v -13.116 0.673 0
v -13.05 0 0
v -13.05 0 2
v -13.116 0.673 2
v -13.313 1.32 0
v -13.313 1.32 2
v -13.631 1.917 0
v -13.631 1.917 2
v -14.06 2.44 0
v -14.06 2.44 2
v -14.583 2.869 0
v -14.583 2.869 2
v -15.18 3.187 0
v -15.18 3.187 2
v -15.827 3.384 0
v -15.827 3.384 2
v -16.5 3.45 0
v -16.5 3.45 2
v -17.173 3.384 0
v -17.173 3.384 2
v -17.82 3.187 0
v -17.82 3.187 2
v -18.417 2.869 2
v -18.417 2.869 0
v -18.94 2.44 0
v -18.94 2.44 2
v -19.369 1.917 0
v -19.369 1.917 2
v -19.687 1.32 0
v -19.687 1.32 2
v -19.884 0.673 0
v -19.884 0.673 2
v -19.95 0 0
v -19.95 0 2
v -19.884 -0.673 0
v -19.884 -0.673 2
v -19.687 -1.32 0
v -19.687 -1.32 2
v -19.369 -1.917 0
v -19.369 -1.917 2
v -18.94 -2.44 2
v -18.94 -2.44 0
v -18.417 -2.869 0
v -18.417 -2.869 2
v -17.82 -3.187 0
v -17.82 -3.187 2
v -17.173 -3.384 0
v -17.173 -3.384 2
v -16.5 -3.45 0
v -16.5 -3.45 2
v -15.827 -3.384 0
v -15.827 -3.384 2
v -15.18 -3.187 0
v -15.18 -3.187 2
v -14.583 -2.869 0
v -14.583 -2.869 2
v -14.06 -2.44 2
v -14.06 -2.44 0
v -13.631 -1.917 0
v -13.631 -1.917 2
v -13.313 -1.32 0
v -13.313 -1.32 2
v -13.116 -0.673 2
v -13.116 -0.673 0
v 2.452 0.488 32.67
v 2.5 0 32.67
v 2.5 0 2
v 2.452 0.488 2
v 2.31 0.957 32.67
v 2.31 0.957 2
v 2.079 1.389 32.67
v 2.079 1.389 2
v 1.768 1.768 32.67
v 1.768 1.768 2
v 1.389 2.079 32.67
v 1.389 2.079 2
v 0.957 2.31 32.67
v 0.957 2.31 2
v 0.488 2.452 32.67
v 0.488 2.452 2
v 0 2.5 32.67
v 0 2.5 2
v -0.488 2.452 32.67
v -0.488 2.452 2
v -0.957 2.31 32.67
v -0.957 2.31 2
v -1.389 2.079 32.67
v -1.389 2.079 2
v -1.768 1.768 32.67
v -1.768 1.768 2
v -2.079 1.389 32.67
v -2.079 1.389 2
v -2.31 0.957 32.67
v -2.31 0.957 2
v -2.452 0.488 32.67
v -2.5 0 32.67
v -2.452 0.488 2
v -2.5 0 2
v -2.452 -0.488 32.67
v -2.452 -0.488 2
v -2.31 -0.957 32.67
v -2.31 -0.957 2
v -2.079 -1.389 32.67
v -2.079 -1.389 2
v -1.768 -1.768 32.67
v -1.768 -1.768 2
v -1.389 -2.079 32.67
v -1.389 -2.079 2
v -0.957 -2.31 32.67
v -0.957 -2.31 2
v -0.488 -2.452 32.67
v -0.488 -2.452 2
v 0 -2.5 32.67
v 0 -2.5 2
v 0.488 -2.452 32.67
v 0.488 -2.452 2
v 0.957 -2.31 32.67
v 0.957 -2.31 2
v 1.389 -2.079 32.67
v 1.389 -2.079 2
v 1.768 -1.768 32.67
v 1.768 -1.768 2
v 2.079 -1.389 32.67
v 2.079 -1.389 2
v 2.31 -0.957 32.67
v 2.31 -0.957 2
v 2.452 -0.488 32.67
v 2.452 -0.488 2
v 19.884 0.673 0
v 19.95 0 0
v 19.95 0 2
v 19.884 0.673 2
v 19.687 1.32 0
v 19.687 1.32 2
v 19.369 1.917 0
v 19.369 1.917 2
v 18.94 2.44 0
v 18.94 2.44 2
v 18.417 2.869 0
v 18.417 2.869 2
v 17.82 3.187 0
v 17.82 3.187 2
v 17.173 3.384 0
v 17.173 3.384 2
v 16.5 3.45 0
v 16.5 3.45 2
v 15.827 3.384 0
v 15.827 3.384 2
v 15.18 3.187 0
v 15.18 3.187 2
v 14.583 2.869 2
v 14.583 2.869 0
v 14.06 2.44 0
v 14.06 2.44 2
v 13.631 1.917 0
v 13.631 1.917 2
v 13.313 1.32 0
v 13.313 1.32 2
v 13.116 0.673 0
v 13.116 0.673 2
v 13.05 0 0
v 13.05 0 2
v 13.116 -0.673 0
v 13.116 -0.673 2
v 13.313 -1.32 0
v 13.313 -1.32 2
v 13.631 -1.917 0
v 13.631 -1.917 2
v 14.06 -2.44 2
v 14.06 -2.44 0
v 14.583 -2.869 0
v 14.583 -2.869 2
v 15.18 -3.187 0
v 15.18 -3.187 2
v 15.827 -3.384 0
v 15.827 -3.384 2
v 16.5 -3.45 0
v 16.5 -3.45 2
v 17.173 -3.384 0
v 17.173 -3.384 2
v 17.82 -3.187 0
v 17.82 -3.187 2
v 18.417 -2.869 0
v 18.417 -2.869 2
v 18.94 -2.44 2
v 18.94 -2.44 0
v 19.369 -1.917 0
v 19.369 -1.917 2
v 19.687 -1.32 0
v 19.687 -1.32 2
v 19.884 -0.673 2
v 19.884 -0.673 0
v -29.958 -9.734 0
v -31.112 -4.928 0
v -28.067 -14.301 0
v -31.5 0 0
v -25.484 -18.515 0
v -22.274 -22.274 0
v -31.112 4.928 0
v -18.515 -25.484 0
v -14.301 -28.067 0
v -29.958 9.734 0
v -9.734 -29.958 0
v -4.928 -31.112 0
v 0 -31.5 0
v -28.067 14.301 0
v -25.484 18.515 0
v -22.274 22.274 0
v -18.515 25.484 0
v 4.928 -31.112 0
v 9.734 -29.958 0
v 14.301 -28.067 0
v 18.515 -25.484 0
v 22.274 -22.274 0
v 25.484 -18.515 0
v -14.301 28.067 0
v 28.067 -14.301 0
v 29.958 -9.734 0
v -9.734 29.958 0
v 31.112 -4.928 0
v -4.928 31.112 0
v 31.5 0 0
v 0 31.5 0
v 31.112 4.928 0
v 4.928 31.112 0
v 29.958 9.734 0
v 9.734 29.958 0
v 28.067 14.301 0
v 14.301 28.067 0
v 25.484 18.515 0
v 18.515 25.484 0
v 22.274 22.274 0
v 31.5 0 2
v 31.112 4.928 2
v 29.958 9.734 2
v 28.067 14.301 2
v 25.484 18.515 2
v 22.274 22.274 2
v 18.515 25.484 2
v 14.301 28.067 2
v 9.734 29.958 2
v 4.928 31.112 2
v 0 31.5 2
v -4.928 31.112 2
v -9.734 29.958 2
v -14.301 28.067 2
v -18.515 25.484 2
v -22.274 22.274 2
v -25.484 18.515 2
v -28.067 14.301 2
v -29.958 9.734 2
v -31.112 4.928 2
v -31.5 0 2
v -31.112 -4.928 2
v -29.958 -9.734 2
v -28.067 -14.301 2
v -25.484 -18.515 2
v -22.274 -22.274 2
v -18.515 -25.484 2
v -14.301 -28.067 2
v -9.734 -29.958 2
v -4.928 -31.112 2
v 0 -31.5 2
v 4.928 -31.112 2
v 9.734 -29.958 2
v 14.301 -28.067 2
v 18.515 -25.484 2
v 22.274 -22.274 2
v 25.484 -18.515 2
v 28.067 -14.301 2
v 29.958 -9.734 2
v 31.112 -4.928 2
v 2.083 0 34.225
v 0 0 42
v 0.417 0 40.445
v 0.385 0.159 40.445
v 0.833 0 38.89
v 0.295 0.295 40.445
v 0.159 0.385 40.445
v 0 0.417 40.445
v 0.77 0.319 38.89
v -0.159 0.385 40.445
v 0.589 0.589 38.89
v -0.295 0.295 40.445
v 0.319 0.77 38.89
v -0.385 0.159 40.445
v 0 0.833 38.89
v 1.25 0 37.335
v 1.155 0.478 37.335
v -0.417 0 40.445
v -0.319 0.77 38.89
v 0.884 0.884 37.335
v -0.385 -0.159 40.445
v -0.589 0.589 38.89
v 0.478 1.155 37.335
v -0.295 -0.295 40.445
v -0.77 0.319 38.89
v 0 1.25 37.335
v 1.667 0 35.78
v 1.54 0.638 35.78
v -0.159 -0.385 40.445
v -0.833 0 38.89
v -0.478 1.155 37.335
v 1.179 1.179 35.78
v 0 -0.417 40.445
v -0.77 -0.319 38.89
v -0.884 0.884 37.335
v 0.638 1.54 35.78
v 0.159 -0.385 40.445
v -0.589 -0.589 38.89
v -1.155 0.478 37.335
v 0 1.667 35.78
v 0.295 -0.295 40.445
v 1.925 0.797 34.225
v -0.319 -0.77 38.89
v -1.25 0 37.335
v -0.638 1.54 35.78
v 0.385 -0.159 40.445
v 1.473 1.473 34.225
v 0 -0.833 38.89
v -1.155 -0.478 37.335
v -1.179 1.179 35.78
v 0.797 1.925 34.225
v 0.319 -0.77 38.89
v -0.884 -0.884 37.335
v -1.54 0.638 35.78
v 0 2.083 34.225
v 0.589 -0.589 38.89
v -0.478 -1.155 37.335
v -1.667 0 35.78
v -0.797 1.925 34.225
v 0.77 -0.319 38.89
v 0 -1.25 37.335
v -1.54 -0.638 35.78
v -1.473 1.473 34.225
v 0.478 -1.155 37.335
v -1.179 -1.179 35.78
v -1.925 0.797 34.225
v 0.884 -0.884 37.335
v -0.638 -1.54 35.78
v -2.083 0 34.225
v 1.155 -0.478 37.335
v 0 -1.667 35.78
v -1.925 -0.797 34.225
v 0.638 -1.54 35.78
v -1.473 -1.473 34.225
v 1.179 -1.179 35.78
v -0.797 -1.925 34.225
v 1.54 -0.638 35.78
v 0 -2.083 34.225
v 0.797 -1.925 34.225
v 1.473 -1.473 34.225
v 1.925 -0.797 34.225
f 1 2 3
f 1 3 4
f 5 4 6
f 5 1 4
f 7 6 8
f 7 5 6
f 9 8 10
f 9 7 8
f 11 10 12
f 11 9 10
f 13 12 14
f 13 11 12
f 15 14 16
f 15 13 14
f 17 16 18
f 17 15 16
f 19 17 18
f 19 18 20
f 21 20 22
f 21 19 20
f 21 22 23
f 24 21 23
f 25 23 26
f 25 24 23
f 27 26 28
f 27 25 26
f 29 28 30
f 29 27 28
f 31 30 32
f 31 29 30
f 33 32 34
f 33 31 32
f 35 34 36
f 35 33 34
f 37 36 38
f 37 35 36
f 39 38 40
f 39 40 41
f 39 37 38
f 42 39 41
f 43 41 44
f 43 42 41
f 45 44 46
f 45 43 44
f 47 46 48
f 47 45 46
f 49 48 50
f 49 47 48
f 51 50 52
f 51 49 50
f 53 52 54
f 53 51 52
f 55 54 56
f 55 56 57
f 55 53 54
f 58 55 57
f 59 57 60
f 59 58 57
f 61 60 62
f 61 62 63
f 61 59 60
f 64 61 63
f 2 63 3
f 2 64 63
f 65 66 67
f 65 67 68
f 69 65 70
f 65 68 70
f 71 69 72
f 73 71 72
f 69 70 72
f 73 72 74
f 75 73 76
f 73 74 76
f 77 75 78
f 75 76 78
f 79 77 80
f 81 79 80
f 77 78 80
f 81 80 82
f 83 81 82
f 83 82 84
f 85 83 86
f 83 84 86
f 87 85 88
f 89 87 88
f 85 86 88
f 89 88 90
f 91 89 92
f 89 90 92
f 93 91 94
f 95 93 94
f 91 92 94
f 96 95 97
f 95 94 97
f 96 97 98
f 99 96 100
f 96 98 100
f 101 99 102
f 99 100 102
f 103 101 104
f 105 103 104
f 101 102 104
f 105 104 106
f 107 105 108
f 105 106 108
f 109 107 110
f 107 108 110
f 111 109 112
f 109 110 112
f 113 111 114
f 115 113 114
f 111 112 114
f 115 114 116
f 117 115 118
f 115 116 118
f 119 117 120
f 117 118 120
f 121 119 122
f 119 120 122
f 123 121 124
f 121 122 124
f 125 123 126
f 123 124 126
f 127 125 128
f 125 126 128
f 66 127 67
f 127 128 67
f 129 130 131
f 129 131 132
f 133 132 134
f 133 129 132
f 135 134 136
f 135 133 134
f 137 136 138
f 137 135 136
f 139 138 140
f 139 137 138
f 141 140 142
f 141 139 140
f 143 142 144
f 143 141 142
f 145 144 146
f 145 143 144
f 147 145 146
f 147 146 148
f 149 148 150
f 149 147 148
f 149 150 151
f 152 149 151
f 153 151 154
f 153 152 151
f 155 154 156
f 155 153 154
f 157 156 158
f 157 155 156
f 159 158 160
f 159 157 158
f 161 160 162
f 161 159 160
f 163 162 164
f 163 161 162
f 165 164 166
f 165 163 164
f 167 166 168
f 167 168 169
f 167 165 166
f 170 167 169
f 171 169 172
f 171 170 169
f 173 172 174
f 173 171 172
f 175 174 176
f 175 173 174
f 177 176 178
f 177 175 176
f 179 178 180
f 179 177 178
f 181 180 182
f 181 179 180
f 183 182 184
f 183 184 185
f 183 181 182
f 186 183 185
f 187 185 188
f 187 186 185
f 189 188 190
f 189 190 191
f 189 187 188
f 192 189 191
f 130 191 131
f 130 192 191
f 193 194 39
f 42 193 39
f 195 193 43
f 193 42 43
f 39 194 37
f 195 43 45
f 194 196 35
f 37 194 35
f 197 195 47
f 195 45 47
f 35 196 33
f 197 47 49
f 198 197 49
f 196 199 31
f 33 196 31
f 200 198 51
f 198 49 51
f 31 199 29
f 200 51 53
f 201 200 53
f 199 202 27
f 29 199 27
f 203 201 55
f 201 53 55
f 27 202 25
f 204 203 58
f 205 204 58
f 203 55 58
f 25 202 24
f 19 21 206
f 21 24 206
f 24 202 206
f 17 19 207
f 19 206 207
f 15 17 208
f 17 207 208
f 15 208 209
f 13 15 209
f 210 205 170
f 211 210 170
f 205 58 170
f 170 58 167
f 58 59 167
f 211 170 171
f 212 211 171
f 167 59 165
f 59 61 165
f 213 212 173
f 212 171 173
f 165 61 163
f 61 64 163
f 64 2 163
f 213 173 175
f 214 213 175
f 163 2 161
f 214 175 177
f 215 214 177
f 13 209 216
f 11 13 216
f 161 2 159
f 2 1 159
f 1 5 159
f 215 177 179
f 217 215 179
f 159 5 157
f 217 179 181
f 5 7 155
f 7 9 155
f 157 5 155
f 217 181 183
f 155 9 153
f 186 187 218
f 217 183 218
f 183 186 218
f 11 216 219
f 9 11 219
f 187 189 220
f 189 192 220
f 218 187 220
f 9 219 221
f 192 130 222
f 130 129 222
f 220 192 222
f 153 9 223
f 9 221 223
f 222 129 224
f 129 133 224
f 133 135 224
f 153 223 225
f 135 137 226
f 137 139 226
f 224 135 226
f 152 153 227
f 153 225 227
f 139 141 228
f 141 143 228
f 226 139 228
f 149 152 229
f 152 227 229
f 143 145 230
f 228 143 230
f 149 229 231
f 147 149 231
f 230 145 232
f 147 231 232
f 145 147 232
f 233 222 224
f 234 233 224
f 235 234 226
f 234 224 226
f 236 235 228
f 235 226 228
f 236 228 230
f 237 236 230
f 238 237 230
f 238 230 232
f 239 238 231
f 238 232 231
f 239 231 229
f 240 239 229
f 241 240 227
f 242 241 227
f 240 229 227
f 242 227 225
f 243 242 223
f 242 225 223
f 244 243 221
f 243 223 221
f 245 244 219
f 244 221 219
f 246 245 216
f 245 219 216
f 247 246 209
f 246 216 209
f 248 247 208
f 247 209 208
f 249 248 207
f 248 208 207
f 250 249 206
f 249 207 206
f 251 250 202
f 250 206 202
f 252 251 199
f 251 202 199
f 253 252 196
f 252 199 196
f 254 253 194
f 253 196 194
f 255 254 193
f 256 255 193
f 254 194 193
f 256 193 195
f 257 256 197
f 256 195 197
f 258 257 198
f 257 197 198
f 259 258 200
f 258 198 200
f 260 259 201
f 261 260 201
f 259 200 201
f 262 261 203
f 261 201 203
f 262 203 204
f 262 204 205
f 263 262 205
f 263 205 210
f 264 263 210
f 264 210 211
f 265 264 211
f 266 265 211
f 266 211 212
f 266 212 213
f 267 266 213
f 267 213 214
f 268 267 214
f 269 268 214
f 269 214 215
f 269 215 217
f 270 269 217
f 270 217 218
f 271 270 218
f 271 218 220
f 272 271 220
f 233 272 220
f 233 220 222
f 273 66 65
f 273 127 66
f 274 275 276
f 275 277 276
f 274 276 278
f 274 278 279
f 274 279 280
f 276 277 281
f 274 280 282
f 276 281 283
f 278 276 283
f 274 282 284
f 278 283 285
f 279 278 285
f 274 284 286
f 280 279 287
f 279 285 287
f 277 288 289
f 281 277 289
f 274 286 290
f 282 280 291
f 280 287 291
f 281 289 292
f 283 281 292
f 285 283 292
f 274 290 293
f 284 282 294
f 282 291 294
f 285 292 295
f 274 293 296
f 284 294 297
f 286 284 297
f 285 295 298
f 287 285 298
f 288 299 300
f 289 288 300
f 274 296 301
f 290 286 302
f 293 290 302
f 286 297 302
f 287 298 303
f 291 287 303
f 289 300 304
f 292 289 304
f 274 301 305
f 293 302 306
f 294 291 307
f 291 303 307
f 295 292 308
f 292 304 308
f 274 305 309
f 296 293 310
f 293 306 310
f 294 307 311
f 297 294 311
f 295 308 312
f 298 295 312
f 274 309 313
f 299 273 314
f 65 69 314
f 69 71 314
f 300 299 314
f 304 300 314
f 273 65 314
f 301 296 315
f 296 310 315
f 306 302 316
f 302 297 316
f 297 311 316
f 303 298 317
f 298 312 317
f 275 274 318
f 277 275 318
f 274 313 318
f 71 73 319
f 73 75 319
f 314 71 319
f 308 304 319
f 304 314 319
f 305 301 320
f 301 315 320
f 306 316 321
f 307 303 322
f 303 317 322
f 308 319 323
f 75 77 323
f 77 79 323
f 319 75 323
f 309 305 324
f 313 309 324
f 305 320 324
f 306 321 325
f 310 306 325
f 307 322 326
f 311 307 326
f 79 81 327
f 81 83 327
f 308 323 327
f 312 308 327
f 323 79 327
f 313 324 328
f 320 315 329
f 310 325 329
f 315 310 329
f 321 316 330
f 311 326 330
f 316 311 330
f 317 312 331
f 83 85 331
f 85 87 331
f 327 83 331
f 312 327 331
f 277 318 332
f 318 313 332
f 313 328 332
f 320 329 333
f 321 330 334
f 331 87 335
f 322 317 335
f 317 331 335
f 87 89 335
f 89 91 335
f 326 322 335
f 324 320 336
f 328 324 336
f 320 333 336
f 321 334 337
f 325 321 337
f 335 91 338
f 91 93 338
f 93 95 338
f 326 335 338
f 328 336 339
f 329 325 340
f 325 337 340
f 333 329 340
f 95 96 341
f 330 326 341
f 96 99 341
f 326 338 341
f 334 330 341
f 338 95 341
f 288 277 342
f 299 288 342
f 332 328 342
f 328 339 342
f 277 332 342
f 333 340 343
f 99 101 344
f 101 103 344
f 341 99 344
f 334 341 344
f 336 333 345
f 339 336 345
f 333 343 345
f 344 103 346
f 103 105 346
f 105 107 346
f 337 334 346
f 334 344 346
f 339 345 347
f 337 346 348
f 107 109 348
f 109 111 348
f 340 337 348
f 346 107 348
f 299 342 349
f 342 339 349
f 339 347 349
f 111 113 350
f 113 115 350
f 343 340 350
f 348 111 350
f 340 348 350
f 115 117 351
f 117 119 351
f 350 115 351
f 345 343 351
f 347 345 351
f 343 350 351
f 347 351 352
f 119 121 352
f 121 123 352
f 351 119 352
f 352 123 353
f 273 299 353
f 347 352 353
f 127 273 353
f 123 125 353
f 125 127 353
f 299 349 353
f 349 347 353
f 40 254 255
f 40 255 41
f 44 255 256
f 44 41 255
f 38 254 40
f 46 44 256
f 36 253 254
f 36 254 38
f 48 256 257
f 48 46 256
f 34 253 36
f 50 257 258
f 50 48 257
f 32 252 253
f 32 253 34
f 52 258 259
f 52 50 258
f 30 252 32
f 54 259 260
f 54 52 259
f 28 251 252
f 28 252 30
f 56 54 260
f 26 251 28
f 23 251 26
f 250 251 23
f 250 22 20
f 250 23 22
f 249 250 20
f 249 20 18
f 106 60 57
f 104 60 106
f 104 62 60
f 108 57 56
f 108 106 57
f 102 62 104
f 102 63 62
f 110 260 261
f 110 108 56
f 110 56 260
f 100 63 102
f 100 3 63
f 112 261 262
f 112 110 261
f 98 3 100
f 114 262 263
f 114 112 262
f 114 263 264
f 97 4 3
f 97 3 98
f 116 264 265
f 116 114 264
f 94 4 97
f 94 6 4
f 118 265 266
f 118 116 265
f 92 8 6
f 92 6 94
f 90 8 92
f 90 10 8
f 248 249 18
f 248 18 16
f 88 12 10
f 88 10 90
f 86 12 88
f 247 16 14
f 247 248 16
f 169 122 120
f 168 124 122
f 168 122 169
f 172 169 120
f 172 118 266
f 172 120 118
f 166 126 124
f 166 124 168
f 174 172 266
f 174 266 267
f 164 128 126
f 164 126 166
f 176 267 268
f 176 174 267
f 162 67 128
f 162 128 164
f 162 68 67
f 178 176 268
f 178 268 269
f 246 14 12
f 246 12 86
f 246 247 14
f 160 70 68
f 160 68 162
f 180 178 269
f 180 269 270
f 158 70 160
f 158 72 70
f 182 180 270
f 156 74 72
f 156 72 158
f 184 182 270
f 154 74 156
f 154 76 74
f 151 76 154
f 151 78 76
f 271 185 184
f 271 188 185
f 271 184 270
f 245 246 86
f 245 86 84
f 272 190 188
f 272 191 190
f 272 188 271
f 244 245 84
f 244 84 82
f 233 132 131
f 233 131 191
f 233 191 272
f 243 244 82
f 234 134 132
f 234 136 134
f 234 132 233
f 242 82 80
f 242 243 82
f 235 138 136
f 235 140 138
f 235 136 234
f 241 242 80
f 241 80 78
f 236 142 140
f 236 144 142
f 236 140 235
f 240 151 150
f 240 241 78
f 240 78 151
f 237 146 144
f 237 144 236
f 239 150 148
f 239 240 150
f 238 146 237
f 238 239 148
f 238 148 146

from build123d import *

# Parameters (mm, degrees)
F0_R     = 31.5
F0_R_2   = 3.45
F1_DEPTH = 2
F2_R     = 2.5
F3_DEPTH = 40
F4_SIZE2 = 9.3301270189
F4_SIZE  = 2.5


with BuildPart() as f1:
    # F0 (on Top) → F1 (new body)
    with BuildSketch(Plane.XY):
        Circle(F0_R)
        with Locations((-16.5, 0)):
            Circle(F0_R_2, mode=Mode.SUBTRACT)
        with Locations((16.5, 0)):
            Circle(F0_R_2, mode=Mode.SUBTRACT)
    extrude(amount=F1_DEPTH)

    # F2 (on face) → F3 (join)
    with BuildSketch(Plane.XY.offset(2)):
        Circle(F2_R)
    extrude(amount=F3_DEPTH)

    # F4
    f4_edges = [f1.edges().sort_by_distance(p)[0] for p in [
        (-2.5, 0, 42),
    ]]
    f4_side = f1.faces().sort_by_distance((0, 0, 42))[0]
    chamfer(f4_edges, length=F4_SIZE, length2=F4_SIZE2, reference=f4_side)


solid = f1.part
